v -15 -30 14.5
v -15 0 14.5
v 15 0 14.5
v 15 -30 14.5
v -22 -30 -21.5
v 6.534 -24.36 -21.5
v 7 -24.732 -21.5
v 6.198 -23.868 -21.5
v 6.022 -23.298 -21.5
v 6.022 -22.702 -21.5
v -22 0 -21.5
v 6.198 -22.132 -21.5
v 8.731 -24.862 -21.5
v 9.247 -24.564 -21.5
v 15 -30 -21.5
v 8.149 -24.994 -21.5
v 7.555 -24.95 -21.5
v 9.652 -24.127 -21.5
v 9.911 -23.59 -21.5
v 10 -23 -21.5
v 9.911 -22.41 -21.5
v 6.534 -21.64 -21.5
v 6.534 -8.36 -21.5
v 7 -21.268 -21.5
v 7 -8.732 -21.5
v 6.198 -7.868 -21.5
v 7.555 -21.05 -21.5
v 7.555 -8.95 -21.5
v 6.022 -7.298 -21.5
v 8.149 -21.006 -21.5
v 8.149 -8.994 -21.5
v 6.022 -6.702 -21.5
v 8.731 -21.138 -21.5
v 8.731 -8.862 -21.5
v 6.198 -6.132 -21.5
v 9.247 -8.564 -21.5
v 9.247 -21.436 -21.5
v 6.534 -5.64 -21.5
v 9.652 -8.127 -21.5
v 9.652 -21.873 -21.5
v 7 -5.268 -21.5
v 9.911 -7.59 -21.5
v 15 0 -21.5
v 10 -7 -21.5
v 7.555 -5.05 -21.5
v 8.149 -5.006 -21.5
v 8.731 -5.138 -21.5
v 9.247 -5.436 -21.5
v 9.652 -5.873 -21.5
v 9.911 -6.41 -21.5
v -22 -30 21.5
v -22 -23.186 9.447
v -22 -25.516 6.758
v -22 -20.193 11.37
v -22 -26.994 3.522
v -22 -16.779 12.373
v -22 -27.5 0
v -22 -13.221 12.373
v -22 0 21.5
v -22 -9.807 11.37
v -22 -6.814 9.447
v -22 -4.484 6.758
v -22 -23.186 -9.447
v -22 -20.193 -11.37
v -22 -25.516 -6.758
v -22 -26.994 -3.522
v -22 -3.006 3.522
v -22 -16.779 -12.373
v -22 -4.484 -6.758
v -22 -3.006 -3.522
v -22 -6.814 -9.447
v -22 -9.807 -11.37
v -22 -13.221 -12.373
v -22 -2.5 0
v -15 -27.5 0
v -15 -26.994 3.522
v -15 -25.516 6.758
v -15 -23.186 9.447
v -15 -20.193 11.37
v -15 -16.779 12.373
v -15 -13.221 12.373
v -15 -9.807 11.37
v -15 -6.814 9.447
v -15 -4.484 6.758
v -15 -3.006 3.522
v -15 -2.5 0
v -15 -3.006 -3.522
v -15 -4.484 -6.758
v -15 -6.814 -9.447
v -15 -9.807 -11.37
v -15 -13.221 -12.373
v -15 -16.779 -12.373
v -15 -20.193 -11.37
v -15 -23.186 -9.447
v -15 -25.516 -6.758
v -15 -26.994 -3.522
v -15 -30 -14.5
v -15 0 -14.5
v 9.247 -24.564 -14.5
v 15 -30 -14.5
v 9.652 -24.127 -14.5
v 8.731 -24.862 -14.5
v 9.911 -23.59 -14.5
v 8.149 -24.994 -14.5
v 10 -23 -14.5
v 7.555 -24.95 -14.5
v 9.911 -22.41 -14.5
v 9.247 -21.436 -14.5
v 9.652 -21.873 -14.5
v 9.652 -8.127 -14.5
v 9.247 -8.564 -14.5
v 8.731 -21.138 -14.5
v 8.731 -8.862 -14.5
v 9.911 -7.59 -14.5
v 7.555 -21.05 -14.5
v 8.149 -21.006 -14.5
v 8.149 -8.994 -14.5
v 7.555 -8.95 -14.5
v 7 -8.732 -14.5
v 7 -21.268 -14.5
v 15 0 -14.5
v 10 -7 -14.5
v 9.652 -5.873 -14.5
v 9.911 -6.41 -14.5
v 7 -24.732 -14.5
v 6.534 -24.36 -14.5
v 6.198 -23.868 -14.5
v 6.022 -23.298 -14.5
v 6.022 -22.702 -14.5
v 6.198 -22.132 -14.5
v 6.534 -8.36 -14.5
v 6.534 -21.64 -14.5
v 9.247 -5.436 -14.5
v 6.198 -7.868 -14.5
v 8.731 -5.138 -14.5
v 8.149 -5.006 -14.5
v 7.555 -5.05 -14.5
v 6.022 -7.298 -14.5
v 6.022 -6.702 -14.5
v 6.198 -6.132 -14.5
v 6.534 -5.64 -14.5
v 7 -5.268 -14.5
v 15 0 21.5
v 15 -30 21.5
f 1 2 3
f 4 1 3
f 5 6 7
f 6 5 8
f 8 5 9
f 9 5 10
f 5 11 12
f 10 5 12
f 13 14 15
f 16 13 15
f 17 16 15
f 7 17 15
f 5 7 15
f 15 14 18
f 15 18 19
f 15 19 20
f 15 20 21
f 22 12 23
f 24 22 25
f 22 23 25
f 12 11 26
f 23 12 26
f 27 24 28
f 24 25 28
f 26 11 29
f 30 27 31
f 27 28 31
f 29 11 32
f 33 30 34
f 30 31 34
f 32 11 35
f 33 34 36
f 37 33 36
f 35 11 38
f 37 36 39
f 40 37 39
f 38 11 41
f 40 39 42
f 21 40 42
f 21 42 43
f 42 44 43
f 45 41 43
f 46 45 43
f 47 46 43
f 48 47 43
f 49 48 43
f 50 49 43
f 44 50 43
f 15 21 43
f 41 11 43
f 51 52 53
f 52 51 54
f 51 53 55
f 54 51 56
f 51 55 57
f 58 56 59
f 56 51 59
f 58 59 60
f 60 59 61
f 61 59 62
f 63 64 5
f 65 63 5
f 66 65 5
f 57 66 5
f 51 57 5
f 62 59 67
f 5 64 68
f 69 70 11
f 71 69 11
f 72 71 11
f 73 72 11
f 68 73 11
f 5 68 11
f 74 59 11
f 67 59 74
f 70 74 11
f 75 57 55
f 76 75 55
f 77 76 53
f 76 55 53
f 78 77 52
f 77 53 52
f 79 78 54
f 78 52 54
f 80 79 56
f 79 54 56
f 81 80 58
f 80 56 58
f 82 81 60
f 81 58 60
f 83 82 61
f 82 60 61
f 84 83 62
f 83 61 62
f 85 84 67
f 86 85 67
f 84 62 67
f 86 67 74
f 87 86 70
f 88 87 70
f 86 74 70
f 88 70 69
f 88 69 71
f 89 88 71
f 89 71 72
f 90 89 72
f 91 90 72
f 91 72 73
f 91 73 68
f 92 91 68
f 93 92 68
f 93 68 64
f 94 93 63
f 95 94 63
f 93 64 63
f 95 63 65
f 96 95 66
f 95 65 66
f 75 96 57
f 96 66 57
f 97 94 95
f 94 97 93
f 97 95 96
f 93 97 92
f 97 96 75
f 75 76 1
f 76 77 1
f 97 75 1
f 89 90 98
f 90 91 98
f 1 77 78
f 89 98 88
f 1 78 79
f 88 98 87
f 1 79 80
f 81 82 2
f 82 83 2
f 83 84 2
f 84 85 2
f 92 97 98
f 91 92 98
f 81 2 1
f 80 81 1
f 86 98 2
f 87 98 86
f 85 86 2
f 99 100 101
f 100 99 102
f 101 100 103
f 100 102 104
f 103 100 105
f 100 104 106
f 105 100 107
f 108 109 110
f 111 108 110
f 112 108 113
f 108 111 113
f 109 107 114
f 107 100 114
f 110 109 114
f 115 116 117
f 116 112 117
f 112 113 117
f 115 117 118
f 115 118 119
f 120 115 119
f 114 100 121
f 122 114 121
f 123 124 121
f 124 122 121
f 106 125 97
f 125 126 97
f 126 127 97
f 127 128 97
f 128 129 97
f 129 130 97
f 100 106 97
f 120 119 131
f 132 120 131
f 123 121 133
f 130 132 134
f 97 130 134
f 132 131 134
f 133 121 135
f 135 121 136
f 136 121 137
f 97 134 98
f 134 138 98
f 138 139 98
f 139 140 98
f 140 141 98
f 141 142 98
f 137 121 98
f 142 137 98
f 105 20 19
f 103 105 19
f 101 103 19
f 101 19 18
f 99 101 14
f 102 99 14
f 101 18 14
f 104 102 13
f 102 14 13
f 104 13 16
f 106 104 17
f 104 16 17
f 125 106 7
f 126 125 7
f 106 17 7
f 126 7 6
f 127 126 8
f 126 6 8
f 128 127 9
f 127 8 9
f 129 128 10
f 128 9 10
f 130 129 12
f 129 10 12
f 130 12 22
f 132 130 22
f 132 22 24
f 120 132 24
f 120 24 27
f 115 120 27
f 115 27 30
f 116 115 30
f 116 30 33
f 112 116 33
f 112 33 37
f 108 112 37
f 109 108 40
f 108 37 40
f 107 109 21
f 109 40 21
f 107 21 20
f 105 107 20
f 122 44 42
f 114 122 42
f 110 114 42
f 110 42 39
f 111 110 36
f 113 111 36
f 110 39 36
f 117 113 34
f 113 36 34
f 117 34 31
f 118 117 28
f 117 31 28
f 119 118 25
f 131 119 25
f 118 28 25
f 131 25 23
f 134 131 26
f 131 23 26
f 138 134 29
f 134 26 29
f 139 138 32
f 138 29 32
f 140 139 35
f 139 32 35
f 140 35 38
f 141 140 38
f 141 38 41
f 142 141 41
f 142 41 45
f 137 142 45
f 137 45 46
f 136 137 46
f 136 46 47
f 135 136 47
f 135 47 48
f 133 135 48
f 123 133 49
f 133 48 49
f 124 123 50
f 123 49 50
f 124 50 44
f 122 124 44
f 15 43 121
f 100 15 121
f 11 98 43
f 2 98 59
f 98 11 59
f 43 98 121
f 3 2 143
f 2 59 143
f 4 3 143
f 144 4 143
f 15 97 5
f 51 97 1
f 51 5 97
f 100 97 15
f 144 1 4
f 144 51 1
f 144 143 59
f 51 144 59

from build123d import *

# Parameters (mm, degrees)
F1_DEPTH = 30
F3_R     = 2
F4_DEPTH = 7
F5_R     = 12.5
F6_DEPTH = 7


with BuildPart() as f1:
    # F0 (on Front) → F1 (new body)
    with BuildSketch(Plane.XZ):
        Polygon((15, -21.5), (15, -14.5), (-15, -14.5), (-15, 14.5), (15, 14.5), (15, 21.5), (-22, 21.5), (-22, -21.5), align=None)
    extrude(amount=F1_DEPTH)

    # F3 (on face) → F4 (cut, through all)
    with BuildSketch(Plane(origin=(0, 0, -21.5), x_dir=(1, 0, 0), z_dir=(0, 0, -1))):
        with Locations((8, 23)):
            Circle(F3_R)
        with Locations((8, 7)):
            Circle(F3_R)
    extrude(amount=-F4_DEPTH, mode=Mode.SUBTRACT)

    # F5 (on face) → F6 (cut, through all)
    with BuildSketch(Plane(origin=(-22, 0, 0), x_dir=(0, -1, 0), z_dir=(-1, 0, 0))):
        with Locations((15, 0)):
            Circle(F5_R)
    extrude(amount=-F6_DEPTH, mode=Mode.SUBTRACT)


solid = f1.part
